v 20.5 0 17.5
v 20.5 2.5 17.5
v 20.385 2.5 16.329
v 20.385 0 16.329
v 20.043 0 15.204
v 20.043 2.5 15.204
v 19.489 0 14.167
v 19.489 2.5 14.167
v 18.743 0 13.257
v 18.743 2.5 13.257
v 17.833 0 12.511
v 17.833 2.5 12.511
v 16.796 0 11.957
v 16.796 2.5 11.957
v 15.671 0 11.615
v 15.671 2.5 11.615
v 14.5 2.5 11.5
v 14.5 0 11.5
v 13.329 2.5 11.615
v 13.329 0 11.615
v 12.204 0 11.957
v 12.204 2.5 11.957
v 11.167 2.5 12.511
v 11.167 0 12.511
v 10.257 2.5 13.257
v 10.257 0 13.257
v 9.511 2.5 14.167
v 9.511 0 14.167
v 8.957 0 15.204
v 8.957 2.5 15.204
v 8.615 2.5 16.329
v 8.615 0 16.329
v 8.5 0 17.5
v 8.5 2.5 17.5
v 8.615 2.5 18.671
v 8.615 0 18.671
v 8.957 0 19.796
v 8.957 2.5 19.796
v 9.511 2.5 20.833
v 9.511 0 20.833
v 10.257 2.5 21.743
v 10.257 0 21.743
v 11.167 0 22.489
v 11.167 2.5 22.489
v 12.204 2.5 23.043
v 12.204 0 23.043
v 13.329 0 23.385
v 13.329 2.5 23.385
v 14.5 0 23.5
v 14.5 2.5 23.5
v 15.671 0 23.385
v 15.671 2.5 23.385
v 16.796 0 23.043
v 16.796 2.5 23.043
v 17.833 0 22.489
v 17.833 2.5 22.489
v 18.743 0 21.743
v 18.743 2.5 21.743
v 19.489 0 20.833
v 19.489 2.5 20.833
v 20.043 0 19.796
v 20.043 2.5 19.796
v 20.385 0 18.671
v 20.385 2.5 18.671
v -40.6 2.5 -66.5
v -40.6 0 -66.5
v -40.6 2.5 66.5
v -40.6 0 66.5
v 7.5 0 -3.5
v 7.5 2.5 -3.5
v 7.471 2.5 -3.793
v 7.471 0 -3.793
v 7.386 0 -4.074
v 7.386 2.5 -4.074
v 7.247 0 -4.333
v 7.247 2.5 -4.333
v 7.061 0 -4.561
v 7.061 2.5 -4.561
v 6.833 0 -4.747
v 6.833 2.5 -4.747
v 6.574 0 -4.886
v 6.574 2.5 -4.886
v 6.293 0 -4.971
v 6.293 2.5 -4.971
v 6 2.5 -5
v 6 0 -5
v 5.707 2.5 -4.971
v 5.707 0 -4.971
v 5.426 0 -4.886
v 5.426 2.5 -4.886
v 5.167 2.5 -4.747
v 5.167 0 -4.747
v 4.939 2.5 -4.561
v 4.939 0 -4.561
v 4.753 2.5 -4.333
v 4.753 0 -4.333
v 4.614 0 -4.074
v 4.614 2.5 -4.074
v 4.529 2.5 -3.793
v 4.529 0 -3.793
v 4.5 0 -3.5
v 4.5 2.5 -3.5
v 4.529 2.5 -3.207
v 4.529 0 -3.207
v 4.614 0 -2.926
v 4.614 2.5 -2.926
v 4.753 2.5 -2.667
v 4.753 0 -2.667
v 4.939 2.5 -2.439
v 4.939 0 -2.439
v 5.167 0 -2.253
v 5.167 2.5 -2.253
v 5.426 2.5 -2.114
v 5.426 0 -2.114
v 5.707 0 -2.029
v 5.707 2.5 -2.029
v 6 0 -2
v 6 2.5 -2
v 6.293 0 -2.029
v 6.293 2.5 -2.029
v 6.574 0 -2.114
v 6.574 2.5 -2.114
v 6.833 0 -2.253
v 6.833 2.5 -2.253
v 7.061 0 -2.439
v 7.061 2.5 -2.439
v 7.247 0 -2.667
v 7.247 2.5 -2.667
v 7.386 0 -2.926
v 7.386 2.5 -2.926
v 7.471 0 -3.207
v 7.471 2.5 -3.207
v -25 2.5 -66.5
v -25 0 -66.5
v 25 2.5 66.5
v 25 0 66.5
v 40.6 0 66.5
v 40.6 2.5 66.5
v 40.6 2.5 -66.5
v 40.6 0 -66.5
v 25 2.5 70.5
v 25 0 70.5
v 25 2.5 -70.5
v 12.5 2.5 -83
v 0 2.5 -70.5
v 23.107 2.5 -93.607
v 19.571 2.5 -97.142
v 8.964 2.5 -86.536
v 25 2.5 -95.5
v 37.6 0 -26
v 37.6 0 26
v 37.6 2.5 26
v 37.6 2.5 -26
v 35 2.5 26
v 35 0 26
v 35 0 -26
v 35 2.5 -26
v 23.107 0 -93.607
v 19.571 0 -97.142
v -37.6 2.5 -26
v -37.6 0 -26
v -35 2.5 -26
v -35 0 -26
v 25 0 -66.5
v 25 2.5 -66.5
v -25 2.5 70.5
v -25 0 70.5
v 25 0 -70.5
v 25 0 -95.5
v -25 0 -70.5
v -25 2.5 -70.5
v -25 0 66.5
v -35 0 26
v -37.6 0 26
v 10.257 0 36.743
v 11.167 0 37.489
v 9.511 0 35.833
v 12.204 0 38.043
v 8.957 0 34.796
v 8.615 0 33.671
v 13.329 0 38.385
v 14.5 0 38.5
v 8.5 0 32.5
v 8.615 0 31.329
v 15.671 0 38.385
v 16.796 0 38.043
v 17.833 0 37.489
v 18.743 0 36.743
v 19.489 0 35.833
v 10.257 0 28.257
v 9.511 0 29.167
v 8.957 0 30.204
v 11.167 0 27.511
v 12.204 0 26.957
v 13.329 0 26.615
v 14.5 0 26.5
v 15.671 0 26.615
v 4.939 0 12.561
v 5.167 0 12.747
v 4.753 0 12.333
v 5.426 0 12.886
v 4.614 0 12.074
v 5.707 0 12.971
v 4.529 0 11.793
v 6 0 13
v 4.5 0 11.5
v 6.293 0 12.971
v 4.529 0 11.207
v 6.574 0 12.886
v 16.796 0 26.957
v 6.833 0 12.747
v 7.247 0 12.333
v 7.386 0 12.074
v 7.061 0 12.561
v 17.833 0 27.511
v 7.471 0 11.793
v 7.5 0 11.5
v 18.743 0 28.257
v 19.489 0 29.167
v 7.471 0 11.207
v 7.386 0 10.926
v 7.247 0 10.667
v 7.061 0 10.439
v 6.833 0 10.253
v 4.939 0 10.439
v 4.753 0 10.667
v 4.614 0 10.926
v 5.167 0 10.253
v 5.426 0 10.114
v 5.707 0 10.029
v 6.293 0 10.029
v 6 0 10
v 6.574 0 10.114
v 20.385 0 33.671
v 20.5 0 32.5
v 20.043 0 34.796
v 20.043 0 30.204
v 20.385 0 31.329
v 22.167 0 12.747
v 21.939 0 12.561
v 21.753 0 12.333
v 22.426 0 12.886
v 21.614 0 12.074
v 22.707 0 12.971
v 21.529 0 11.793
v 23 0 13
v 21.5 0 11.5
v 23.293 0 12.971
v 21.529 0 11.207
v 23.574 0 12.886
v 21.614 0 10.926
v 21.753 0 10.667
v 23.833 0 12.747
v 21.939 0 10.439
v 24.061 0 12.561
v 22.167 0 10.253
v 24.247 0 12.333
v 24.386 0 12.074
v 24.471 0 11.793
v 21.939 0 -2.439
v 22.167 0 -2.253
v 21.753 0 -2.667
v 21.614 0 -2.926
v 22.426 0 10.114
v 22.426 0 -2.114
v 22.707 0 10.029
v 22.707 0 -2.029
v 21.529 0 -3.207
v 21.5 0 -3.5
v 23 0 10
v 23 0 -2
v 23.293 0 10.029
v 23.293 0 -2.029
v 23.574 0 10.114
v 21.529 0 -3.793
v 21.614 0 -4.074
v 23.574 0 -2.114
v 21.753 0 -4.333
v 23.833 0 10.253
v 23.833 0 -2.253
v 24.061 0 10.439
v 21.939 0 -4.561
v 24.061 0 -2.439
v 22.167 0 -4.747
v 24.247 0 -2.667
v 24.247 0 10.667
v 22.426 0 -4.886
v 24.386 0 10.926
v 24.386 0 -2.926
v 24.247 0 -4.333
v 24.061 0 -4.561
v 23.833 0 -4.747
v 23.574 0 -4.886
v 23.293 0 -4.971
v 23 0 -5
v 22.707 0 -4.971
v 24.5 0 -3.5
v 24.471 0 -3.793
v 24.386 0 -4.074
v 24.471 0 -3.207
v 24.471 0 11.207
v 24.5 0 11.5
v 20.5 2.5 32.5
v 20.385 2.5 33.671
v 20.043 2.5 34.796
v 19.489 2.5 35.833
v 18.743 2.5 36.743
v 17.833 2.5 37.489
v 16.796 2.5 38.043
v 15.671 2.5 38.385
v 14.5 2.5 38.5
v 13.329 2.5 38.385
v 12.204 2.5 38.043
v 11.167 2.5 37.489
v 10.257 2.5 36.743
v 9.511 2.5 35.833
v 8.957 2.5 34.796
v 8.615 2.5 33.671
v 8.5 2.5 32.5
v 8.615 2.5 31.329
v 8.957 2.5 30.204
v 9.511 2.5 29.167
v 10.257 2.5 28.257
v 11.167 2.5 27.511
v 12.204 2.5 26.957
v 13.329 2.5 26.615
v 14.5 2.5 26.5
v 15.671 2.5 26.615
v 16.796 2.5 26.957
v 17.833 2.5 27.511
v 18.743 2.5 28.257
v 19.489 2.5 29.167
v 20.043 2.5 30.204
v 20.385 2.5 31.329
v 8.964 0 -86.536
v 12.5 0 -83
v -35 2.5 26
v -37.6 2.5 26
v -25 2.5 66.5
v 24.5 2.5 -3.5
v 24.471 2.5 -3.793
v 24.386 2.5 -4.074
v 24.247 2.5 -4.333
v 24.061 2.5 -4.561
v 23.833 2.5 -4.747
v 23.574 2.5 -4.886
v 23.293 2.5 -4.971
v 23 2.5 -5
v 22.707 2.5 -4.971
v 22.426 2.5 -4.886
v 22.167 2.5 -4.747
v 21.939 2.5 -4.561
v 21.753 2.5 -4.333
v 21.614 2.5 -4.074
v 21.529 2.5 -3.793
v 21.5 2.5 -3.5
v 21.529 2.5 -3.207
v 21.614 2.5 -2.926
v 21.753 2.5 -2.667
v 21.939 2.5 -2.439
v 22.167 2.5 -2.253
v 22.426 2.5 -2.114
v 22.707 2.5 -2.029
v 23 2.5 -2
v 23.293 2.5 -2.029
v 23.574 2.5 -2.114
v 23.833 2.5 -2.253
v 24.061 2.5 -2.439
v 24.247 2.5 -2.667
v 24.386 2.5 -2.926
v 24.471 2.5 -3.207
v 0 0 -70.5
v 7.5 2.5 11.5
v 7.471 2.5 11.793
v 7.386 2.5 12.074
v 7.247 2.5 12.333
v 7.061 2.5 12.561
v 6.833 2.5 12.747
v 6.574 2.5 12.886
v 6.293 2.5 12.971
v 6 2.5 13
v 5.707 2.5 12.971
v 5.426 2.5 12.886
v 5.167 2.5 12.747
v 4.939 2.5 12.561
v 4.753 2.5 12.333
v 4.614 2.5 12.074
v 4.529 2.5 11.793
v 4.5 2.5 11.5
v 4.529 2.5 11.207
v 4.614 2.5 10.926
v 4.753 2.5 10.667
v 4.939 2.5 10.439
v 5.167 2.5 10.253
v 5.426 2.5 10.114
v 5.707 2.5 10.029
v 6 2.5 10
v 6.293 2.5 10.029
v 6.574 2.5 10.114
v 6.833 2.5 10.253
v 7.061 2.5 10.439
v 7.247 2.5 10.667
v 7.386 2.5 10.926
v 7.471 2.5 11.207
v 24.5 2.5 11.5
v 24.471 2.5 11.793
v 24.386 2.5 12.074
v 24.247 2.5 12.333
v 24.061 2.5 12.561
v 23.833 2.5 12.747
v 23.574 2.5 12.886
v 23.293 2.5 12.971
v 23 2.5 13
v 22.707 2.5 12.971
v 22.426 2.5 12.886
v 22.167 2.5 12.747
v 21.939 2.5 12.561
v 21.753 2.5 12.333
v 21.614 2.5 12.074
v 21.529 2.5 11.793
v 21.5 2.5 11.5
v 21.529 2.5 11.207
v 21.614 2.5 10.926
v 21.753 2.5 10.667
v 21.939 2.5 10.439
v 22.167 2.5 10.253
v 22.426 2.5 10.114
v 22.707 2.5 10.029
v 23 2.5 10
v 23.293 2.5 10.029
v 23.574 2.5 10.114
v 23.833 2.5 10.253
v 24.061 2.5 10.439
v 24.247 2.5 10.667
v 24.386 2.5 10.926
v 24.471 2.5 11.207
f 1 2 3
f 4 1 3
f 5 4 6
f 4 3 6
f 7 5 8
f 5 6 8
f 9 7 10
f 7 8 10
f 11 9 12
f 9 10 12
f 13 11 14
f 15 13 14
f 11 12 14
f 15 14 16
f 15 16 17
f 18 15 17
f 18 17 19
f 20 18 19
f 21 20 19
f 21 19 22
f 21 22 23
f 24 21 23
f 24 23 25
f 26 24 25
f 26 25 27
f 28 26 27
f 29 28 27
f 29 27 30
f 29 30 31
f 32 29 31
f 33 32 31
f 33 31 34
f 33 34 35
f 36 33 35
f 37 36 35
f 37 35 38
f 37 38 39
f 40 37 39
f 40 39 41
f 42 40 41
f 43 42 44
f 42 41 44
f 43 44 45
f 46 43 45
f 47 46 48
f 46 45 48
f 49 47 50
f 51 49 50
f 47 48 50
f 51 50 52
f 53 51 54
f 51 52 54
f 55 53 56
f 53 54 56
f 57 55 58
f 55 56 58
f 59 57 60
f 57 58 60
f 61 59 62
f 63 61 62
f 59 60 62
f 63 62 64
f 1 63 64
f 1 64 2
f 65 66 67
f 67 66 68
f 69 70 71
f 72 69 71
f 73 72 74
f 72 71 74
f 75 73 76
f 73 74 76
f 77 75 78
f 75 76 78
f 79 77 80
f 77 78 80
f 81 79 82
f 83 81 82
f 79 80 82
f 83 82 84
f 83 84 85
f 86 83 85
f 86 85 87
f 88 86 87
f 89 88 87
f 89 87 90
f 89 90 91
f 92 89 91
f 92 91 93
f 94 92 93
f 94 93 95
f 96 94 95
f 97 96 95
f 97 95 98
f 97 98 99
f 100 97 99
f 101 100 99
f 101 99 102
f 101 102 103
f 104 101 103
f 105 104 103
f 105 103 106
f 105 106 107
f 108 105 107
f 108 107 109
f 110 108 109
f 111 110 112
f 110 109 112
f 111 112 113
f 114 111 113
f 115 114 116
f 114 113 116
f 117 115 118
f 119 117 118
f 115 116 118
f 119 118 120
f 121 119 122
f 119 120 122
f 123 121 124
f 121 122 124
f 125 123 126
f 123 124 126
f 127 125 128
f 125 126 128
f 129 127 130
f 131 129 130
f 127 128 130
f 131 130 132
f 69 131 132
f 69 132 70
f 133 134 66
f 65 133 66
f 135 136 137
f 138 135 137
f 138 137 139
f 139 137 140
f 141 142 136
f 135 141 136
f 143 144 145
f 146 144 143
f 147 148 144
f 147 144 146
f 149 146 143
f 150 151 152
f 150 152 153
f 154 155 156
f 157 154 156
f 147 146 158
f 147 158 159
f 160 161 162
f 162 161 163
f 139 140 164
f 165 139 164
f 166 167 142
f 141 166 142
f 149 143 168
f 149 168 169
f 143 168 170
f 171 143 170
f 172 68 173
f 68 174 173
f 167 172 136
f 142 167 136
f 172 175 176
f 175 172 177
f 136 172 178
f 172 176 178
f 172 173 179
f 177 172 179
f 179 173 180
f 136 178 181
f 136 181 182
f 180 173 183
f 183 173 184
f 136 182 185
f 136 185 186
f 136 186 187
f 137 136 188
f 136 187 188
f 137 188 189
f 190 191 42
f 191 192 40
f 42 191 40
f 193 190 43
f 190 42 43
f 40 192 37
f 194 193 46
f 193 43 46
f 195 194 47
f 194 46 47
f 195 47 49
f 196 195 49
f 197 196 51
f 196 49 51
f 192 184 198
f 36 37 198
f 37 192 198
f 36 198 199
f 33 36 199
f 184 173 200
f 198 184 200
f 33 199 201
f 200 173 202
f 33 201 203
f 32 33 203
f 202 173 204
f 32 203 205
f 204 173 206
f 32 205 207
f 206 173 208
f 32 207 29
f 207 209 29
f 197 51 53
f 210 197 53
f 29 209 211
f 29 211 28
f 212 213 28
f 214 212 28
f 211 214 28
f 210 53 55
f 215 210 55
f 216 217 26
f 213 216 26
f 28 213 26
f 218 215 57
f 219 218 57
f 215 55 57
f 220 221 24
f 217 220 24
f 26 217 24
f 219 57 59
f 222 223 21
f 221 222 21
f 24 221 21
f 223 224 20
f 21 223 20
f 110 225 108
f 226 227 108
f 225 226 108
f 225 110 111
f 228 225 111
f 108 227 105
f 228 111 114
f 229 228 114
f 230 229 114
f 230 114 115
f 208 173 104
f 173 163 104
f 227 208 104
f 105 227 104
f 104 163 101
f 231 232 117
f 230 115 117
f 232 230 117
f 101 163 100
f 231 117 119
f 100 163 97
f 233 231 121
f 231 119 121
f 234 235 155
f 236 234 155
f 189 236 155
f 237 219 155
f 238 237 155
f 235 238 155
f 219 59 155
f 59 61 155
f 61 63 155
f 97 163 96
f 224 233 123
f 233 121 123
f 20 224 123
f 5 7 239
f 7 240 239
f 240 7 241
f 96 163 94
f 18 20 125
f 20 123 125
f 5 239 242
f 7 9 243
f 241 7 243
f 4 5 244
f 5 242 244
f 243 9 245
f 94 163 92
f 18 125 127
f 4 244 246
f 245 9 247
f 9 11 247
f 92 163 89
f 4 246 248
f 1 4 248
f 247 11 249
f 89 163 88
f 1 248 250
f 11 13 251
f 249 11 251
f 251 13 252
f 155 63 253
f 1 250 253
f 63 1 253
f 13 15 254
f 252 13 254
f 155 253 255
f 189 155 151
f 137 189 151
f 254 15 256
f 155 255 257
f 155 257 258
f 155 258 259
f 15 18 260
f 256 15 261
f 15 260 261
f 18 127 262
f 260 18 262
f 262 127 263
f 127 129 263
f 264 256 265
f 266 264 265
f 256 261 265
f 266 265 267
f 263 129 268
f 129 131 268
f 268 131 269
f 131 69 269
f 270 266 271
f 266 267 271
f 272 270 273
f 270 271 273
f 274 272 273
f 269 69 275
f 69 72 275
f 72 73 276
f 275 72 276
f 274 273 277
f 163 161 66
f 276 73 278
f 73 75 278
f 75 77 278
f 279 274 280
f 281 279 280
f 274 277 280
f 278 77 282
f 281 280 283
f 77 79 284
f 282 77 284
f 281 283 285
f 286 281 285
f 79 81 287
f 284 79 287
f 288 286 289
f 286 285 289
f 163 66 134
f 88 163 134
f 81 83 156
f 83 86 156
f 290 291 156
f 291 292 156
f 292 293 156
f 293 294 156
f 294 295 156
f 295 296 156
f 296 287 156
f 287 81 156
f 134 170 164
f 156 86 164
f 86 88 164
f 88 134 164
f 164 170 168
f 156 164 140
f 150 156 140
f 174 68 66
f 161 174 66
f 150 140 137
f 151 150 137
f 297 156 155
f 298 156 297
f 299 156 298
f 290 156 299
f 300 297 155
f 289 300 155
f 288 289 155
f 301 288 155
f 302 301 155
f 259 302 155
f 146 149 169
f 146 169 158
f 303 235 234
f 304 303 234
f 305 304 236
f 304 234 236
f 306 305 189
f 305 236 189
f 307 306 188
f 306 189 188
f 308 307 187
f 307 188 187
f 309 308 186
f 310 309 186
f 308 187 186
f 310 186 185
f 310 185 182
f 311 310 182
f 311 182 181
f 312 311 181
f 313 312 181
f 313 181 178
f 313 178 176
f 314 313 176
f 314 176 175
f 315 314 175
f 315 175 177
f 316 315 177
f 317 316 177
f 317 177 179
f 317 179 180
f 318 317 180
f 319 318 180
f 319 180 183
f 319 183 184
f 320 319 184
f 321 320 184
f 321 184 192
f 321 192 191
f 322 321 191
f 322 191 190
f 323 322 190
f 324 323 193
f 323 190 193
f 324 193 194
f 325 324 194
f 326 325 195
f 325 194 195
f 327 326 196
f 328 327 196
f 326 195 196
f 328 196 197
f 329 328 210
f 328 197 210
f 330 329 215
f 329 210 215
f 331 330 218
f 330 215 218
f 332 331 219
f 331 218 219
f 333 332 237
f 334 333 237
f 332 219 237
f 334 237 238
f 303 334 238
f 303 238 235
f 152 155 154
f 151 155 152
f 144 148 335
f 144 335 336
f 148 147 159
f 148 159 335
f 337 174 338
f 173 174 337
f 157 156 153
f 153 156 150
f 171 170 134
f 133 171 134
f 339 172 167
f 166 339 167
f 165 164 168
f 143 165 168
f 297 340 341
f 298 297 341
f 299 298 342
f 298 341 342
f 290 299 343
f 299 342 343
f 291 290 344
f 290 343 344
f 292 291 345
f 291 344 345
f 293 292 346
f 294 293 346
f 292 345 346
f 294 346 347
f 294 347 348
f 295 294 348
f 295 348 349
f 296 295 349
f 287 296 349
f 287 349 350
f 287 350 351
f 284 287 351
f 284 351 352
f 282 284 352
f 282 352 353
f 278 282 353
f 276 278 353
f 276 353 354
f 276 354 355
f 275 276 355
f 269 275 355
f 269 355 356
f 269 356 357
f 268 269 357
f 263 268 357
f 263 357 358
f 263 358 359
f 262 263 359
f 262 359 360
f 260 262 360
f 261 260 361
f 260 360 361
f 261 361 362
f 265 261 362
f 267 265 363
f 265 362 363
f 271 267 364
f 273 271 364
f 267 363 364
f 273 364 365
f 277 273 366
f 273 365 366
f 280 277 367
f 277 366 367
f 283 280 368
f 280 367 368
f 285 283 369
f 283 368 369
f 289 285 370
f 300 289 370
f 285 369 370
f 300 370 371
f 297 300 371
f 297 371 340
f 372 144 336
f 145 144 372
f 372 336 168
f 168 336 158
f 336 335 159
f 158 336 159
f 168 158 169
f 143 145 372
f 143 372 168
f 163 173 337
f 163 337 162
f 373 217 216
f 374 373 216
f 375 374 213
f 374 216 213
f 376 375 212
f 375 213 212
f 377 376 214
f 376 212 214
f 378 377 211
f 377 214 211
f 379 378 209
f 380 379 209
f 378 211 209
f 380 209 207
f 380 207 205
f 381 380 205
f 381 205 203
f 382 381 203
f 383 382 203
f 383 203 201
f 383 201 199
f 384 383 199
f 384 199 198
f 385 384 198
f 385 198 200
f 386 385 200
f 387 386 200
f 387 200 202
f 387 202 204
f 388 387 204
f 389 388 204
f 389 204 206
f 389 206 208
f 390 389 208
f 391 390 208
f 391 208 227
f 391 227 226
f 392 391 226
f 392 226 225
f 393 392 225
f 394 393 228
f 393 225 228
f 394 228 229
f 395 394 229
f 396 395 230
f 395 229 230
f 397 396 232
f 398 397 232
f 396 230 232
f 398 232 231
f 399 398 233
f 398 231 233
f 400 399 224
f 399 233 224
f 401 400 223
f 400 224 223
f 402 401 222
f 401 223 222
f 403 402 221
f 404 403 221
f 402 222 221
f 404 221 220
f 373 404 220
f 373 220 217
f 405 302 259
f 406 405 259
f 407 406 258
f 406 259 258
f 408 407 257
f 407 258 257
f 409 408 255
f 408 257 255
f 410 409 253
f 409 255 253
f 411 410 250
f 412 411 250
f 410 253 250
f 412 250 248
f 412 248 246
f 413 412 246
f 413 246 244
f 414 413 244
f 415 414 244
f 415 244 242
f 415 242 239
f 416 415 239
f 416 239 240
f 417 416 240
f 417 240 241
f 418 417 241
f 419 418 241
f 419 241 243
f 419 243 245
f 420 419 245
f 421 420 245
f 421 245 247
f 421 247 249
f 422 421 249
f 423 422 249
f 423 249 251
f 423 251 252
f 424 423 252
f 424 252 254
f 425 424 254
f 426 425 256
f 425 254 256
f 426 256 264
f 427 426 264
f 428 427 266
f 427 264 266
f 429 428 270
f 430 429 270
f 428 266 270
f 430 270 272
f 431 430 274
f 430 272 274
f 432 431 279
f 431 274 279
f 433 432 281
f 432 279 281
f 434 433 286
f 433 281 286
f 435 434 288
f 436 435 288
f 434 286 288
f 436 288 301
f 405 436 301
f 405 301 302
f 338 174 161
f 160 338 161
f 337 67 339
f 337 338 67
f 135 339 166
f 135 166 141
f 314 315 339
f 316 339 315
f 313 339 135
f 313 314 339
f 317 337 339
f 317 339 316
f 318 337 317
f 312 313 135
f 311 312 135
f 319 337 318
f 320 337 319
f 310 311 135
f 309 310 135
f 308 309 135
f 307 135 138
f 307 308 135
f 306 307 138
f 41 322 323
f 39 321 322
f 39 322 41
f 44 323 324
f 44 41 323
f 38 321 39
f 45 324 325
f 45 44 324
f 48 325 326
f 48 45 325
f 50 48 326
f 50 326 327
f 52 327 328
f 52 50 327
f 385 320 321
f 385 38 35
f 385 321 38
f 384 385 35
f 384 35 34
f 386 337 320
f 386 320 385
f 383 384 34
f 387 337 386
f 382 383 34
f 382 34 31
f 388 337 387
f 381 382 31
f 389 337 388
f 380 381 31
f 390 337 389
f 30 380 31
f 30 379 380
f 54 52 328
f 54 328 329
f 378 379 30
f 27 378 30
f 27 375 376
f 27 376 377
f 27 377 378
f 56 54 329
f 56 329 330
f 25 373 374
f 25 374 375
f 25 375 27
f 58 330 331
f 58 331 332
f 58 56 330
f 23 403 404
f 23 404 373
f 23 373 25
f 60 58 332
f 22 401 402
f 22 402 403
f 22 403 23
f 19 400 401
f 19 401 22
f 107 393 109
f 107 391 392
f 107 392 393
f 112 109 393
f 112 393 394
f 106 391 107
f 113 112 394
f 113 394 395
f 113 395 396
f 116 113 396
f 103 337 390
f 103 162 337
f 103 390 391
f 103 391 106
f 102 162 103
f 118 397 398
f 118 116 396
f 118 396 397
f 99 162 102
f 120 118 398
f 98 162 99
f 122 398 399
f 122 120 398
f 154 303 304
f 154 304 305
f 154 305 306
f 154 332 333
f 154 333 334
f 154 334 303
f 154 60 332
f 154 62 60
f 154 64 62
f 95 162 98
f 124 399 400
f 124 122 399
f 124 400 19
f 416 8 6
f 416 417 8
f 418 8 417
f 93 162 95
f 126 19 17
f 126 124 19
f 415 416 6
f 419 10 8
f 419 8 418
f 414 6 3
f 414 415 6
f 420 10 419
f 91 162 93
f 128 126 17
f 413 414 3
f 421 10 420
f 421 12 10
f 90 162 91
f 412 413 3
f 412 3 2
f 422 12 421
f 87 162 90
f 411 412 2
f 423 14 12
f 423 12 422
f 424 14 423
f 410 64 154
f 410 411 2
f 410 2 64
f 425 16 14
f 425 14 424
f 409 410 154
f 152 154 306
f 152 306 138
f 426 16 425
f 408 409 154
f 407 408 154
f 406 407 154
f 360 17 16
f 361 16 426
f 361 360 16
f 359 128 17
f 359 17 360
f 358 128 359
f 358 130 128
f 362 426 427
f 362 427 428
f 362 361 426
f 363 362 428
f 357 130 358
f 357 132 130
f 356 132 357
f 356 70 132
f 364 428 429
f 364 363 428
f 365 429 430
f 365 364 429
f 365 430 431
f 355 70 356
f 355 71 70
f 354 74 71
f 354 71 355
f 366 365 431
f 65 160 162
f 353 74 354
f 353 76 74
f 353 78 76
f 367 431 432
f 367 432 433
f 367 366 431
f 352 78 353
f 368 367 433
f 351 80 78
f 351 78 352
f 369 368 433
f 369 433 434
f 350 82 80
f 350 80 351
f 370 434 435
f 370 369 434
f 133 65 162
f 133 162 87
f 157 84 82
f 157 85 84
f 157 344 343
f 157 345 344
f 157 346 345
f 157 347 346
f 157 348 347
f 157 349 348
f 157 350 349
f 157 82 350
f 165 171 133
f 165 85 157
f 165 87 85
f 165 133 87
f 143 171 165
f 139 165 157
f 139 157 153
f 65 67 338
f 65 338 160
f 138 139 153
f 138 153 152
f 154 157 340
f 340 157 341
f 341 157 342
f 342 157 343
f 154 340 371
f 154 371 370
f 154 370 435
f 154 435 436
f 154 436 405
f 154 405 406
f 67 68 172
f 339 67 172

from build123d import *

# Parameters (mm, degrees)
SKETCH1_W           = 2.6
SKETCH1_H           = 52
BOSS_EXTRUDE1_DEPTH = 2.5
SKETCH2_R           = 6
CUT_EXTRUDE1_DEPTH  = 3.5
SKETCH3_R           = 1.5
CUT_EXTRUDE2_DEPTH  = 3.5
SKETCH4_R           = 6
SKETCH4_R_2         = 1.5
CUT_EXTRUDE3_DEPTH  = 3.5
BOSS_EXTRUDE2_DEPTH = 2.5


with BuildPart() as part:
    # Sketch1 → Boss-Extrude1 (new body)
    with BuildSketch(Plane(origin=(0, 0, 0), x_dir=(1, 0, 0), z_dir=(0, 1, 0))):
        Polygon((-25, 66.5), (-40.6, 66.5), (-40.6, -66.5), (-25, -66.5), (-25, -70.5), (25, -70.5), (25, -66.5), (40.6, -66.5), (40.6, 66.5), (25, 66.5), (25, 70.5), (-25, 70.5), align=None)
        with Locations((-36.3, 0)):
            Rectangle(SKETCH1_W, SKETCH1_H, mode=Mode.SUBTRACT)
        with Locations((36.3, 0)):
            Rectangle(SKETCH1_W, SKETCH1_H, mode=Mode.SUBTRACT)
    extrude(amount=BOSS_EXTRUDE1_DEPTH)

    # Sketch2 → Cut-Extrude1 (cut, through all)
    with BuildSketch(Plane.XZ):
        with Locations((14.5, 32.5)):
            Circle(SKETCH2_R)
    extrude(amount=-CUT_EXTRUDE1_DEPTH, mode=Mode.SUBTRACT)

    # Sketch3 → Cut-Extrude2 (cut, through all)
    with BuildSketch(Plane.XZ):
        with Locations((6, 11.5)):
            Circle(SKETCH3_R)
        with Locations((23, 11.5)):
            Circle(SKETCH3_R)
    extrude(amount=-CUT_EXTRUDE2_DEPTH, mode=Mode.SUBTRACT)

    # Sketch4 → Cut-Extrude3 (cut, through all)
    with BuildSketch(Plane(origin=(0, 2.5, 0), x_dir=(1, 0, 0), z_dir=(0, 1, 0))):
        with Locations((14.5, -17.5)):
            Circle(SKETCH4_R)
        with Locations((6, 3.5)):
            Circle(SKETCH4_R_2)
        with Locations((23, 3.5)):
            Circle(SKETCH4_R_2)
    extrude(amount=-CUT_EXTRUDE3_DEPTH, mode=Mode.SUBTRACT)


with BuildPart() as body_2:
    # Sketch5 → Boss-Extrude2 (new body)
    with BuildSketch(Plane(origin=(0, 2.5, 0), x_dir=(1, 0, 0), z_dir=(0, 1, 0))):
        Polygon((12.5, 83), (0, 70.5), (25, 70.5), (25, 95.5), (23.106601718, 93.606601718), (19.571067812, 97.142135624), (8.964466094, 86.535533906), align=None)
    extrude(amount=-BOSS_EXTRUDE2_DEPTH)


solid = Compound([part.part, body_2.part])
